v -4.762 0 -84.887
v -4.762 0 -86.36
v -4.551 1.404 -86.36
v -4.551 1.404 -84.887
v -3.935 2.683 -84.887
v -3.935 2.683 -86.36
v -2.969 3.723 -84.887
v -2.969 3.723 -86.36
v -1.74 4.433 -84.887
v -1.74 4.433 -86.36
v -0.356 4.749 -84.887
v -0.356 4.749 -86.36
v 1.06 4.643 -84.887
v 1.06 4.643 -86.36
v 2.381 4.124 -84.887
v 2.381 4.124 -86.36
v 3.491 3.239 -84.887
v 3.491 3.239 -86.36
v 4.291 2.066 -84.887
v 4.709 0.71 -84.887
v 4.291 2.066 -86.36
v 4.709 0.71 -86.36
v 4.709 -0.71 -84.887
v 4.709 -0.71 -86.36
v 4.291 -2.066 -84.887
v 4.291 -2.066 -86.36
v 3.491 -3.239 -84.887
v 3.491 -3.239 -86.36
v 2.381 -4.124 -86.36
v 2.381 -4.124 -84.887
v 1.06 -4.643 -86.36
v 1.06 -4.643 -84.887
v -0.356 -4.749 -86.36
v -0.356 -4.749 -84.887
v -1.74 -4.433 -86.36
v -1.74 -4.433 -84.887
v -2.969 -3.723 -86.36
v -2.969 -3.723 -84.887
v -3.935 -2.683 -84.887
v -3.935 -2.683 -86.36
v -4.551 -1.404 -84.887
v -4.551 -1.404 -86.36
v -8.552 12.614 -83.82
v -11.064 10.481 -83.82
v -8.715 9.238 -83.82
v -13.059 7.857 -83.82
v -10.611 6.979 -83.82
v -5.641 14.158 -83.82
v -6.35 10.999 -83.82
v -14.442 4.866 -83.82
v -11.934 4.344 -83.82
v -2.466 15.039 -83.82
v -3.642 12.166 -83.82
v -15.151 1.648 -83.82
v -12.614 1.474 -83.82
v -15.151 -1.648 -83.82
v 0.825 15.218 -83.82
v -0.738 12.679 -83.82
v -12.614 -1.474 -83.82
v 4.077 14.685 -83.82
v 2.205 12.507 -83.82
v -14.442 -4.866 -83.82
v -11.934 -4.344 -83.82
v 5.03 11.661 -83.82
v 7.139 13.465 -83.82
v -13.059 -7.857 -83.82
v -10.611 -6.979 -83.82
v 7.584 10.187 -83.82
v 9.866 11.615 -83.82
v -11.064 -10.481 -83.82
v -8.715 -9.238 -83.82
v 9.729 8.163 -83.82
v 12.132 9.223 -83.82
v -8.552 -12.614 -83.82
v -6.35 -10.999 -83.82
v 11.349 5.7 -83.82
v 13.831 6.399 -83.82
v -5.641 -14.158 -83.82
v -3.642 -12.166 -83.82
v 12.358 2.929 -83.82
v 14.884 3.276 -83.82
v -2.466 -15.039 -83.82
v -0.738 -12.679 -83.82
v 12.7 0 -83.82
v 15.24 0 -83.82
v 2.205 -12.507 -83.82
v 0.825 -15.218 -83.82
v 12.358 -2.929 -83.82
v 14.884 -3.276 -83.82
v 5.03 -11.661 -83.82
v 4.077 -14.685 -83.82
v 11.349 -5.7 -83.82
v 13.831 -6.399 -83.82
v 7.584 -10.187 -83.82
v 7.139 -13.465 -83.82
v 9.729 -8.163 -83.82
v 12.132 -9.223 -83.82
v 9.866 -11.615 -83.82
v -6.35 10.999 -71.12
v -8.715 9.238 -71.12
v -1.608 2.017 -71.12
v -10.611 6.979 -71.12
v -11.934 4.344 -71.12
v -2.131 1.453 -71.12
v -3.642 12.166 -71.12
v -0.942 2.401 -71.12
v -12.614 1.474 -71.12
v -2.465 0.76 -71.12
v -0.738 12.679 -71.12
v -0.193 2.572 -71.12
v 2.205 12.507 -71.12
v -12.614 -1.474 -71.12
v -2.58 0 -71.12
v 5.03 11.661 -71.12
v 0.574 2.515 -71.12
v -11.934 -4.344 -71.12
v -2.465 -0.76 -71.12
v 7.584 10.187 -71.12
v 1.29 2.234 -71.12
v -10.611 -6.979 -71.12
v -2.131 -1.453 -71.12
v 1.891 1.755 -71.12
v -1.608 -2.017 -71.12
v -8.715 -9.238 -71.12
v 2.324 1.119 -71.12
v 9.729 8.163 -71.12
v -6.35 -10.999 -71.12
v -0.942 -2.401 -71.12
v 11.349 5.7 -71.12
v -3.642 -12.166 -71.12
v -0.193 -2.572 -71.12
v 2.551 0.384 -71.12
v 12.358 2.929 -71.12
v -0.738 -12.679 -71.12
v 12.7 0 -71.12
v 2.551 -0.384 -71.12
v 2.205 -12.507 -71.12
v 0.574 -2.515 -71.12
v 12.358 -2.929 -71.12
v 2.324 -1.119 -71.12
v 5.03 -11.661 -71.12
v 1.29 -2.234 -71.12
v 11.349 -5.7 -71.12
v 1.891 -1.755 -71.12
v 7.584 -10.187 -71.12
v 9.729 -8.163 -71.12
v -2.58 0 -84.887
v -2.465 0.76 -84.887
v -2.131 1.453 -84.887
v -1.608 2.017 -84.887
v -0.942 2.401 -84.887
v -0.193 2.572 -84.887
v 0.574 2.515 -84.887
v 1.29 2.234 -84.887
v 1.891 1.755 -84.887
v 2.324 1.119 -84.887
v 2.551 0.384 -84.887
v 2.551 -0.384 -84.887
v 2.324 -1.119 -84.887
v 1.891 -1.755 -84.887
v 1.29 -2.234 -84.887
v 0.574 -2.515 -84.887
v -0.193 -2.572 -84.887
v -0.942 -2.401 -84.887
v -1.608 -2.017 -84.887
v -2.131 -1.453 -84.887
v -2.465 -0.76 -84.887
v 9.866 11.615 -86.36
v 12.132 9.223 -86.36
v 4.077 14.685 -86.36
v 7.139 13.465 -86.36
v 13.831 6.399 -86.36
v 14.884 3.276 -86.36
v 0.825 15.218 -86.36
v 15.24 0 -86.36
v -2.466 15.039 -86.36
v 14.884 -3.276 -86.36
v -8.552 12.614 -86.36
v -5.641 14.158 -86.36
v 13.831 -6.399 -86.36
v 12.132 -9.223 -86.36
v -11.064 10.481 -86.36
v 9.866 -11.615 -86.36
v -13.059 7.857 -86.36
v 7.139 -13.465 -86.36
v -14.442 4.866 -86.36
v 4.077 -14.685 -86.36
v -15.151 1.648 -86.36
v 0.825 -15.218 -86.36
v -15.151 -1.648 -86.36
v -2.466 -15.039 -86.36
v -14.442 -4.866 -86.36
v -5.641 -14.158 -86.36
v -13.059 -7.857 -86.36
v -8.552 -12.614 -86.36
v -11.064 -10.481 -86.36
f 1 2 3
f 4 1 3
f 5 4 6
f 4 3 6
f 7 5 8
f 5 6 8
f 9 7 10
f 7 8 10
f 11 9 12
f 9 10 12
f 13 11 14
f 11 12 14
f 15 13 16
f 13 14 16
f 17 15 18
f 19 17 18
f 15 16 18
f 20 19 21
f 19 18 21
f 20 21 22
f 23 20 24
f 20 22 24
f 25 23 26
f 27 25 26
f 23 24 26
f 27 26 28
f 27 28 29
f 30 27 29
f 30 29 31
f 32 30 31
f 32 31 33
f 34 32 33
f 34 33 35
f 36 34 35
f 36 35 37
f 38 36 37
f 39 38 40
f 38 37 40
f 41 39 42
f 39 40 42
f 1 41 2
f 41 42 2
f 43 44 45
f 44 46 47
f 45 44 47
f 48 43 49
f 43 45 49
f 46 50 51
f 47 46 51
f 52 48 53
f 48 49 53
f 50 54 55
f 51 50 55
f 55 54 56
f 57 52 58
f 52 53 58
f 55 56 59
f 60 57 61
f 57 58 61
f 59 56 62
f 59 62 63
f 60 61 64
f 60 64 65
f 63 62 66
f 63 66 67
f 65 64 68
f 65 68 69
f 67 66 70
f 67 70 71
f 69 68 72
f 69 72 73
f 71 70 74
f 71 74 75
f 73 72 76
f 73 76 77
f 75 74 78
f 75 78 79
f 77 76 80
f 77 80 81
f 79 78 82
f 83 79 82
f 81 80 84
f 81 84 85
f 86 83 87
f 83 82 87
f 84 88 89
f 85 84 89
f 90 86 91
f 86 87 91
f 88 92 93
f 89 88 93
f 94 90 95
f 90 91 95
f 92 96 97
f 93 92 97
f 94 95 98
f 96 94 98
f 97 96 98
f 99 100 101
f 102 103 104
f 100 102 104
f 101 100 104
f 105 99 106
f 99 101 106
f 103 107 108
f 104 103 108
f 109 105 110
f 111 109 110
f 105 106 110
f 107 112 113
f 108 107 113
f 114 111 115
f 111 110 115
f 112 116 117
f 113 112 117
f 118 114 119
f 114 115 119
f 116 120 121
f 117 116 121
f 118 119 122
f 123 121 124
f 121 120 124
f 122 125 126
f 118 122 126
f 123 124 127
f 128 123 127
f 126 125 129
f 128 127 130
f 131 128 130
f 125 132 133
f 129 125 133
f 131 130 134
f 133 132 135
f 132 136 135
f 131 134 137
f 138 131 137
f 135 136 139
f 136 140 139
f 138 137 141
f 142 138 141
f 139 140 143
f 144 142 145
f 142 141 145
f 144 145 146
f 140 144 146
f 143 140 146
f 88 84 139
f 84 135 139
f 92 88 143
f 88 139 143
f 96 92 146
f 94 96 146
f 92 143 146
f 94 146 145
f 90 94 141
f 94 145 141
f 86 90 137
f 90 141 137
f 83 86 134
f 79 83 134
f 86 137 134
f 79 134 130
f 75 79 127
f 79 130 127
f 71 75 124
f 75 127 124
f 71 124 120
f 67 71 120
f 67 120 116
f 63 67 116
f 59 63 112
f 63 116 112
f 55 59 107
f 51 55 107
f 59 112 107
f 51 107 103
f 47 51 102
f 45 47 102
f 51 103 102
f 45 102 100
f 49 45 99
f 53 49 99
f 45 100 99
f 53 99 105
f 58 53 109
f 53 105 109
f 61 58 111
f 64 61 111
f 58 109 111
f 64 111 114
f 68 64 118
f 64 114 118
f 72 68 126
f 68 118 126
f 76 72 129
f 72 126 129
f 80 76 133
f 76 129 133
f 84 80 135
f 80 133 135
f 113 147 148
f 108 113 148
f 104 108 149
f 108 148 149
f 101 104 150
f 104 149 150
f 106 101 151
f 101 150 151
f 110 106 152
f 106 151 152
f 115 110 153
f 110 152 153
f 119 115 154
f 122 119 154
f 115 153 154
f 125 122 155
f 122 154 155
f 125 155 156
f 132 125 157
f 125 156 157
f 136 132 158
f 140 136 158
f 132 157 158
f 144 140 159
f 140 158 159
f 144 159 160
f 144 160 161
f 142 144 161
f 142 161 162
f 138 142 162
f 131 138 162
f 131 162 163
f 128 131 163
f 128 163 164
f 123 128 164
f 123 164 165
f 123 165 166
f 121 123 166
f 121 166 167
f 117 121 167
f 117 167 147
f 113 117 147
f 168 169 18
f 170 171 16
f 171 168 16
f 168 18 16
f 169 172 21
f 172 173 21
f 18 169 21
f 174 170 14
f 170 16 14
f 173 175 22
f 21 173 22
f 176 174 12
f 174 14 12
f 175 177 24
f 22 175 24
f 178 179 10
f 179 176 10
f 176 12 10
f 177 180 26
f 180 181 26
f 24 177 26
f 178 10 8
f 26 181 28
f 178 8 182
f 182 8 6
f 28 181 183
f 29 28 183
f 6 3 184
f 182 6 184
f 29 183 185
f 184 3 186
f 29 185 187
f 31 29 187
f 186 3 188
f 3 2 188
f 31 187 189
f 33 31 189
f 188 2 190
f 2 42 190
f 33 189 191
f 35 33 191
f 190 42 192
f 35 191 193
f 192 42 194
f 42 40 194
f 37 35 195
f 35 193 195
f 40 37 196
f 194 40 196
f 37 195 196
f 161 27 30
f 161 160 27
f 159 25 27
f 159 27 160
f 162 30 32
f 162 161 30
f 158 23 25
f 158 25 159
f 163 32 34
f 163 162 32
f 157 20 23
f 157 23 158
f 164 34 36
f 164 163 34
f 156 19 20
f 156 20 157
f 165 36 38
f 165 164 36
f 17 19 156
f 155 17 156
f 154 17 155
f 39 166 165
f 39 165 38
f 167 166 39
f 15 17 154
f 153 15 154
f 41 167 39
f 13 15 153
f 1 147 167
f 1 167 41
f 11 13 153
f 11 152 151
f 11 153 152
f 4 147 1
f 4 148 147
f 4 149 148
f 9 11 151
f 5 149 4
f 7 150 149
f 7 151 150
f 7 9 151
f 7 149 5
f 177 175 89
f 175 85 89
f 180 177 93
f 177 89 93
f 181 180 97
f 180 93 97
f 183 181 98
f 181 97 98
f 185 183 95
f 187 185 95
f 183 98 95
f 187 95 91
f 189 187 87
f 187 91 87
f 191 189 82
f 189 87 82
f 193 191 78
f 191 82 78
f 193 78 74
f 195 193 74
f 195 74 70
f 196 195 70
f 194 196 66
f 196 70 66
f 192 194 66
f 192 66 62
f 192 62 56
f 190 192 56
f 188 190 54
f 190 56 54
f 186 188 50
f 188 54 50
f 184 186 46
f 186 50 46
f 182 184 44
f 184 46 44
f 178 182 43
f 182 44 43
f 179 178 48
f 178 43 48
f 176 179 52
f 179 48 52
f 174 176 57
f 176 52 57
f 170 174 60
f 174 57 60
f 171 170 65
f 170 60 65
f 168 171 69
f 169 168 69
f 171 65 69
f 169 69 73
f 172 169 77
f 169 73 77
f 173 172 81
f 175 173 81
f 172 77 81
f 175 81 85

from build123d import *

# Parameters (mm, degrees)
SKETCH2_R          = 2.5796875
CUT_EXTRUDE1_DEPTH = 27.396454307
SKETCH3_R          = 4.7625
CUT_EXTRUDE2_DEPTH = 1.4732


with BuildPart() as part:
    # Sketch1 → Revolve1 (revolve)
    with BuildSketch(Plane(origin=(0, 0, 0), x_dir=(1, 0, 0), z_dir=(0, 1, 0)), mode=Mode.PRIVATE) as revolve1_sk:
        Polygon((0, 71.120493703), (0, 86.360493703), (-15.24, 86.360493703), (-15.24, 83.820493703), (-12.7, 83.820493703), (-12.7, 71.120493703), align=None)
    revolve(revolve1_sk.sketch.rotate(Axis((0, 0, 0), (0, 0, -1)), 180), axis=Axis((0, 0, 0), (0, 0, -1)))

    # Sketch2 → Cut-Extrude1 (cut, through all)
    with BuildSketch(Plane(origin=(0, 0, -86.360493703), x_dir=(-1, 0, 0), z_dir=(0, 0, -1))):
        Circle(SKETCH2_R)
    extrude(amount=-CUT_EXTRUDE1_DEPTH, mode=Mode.SUBTRACT)

    # Sketch3 → Cut-Extrude2 (cut)
    with BuildSketch(Plane(origin=(0, 0, -86.360493703), x_dir=(-1, 0, 0), z_dir=(0, 0, -1))):
        Circle(SKETCH3_R)
    extrude(amount=-CUT_EXTRUDE2_DEPTH, mode=Mode.SUBTRACT)


solid = part.part
